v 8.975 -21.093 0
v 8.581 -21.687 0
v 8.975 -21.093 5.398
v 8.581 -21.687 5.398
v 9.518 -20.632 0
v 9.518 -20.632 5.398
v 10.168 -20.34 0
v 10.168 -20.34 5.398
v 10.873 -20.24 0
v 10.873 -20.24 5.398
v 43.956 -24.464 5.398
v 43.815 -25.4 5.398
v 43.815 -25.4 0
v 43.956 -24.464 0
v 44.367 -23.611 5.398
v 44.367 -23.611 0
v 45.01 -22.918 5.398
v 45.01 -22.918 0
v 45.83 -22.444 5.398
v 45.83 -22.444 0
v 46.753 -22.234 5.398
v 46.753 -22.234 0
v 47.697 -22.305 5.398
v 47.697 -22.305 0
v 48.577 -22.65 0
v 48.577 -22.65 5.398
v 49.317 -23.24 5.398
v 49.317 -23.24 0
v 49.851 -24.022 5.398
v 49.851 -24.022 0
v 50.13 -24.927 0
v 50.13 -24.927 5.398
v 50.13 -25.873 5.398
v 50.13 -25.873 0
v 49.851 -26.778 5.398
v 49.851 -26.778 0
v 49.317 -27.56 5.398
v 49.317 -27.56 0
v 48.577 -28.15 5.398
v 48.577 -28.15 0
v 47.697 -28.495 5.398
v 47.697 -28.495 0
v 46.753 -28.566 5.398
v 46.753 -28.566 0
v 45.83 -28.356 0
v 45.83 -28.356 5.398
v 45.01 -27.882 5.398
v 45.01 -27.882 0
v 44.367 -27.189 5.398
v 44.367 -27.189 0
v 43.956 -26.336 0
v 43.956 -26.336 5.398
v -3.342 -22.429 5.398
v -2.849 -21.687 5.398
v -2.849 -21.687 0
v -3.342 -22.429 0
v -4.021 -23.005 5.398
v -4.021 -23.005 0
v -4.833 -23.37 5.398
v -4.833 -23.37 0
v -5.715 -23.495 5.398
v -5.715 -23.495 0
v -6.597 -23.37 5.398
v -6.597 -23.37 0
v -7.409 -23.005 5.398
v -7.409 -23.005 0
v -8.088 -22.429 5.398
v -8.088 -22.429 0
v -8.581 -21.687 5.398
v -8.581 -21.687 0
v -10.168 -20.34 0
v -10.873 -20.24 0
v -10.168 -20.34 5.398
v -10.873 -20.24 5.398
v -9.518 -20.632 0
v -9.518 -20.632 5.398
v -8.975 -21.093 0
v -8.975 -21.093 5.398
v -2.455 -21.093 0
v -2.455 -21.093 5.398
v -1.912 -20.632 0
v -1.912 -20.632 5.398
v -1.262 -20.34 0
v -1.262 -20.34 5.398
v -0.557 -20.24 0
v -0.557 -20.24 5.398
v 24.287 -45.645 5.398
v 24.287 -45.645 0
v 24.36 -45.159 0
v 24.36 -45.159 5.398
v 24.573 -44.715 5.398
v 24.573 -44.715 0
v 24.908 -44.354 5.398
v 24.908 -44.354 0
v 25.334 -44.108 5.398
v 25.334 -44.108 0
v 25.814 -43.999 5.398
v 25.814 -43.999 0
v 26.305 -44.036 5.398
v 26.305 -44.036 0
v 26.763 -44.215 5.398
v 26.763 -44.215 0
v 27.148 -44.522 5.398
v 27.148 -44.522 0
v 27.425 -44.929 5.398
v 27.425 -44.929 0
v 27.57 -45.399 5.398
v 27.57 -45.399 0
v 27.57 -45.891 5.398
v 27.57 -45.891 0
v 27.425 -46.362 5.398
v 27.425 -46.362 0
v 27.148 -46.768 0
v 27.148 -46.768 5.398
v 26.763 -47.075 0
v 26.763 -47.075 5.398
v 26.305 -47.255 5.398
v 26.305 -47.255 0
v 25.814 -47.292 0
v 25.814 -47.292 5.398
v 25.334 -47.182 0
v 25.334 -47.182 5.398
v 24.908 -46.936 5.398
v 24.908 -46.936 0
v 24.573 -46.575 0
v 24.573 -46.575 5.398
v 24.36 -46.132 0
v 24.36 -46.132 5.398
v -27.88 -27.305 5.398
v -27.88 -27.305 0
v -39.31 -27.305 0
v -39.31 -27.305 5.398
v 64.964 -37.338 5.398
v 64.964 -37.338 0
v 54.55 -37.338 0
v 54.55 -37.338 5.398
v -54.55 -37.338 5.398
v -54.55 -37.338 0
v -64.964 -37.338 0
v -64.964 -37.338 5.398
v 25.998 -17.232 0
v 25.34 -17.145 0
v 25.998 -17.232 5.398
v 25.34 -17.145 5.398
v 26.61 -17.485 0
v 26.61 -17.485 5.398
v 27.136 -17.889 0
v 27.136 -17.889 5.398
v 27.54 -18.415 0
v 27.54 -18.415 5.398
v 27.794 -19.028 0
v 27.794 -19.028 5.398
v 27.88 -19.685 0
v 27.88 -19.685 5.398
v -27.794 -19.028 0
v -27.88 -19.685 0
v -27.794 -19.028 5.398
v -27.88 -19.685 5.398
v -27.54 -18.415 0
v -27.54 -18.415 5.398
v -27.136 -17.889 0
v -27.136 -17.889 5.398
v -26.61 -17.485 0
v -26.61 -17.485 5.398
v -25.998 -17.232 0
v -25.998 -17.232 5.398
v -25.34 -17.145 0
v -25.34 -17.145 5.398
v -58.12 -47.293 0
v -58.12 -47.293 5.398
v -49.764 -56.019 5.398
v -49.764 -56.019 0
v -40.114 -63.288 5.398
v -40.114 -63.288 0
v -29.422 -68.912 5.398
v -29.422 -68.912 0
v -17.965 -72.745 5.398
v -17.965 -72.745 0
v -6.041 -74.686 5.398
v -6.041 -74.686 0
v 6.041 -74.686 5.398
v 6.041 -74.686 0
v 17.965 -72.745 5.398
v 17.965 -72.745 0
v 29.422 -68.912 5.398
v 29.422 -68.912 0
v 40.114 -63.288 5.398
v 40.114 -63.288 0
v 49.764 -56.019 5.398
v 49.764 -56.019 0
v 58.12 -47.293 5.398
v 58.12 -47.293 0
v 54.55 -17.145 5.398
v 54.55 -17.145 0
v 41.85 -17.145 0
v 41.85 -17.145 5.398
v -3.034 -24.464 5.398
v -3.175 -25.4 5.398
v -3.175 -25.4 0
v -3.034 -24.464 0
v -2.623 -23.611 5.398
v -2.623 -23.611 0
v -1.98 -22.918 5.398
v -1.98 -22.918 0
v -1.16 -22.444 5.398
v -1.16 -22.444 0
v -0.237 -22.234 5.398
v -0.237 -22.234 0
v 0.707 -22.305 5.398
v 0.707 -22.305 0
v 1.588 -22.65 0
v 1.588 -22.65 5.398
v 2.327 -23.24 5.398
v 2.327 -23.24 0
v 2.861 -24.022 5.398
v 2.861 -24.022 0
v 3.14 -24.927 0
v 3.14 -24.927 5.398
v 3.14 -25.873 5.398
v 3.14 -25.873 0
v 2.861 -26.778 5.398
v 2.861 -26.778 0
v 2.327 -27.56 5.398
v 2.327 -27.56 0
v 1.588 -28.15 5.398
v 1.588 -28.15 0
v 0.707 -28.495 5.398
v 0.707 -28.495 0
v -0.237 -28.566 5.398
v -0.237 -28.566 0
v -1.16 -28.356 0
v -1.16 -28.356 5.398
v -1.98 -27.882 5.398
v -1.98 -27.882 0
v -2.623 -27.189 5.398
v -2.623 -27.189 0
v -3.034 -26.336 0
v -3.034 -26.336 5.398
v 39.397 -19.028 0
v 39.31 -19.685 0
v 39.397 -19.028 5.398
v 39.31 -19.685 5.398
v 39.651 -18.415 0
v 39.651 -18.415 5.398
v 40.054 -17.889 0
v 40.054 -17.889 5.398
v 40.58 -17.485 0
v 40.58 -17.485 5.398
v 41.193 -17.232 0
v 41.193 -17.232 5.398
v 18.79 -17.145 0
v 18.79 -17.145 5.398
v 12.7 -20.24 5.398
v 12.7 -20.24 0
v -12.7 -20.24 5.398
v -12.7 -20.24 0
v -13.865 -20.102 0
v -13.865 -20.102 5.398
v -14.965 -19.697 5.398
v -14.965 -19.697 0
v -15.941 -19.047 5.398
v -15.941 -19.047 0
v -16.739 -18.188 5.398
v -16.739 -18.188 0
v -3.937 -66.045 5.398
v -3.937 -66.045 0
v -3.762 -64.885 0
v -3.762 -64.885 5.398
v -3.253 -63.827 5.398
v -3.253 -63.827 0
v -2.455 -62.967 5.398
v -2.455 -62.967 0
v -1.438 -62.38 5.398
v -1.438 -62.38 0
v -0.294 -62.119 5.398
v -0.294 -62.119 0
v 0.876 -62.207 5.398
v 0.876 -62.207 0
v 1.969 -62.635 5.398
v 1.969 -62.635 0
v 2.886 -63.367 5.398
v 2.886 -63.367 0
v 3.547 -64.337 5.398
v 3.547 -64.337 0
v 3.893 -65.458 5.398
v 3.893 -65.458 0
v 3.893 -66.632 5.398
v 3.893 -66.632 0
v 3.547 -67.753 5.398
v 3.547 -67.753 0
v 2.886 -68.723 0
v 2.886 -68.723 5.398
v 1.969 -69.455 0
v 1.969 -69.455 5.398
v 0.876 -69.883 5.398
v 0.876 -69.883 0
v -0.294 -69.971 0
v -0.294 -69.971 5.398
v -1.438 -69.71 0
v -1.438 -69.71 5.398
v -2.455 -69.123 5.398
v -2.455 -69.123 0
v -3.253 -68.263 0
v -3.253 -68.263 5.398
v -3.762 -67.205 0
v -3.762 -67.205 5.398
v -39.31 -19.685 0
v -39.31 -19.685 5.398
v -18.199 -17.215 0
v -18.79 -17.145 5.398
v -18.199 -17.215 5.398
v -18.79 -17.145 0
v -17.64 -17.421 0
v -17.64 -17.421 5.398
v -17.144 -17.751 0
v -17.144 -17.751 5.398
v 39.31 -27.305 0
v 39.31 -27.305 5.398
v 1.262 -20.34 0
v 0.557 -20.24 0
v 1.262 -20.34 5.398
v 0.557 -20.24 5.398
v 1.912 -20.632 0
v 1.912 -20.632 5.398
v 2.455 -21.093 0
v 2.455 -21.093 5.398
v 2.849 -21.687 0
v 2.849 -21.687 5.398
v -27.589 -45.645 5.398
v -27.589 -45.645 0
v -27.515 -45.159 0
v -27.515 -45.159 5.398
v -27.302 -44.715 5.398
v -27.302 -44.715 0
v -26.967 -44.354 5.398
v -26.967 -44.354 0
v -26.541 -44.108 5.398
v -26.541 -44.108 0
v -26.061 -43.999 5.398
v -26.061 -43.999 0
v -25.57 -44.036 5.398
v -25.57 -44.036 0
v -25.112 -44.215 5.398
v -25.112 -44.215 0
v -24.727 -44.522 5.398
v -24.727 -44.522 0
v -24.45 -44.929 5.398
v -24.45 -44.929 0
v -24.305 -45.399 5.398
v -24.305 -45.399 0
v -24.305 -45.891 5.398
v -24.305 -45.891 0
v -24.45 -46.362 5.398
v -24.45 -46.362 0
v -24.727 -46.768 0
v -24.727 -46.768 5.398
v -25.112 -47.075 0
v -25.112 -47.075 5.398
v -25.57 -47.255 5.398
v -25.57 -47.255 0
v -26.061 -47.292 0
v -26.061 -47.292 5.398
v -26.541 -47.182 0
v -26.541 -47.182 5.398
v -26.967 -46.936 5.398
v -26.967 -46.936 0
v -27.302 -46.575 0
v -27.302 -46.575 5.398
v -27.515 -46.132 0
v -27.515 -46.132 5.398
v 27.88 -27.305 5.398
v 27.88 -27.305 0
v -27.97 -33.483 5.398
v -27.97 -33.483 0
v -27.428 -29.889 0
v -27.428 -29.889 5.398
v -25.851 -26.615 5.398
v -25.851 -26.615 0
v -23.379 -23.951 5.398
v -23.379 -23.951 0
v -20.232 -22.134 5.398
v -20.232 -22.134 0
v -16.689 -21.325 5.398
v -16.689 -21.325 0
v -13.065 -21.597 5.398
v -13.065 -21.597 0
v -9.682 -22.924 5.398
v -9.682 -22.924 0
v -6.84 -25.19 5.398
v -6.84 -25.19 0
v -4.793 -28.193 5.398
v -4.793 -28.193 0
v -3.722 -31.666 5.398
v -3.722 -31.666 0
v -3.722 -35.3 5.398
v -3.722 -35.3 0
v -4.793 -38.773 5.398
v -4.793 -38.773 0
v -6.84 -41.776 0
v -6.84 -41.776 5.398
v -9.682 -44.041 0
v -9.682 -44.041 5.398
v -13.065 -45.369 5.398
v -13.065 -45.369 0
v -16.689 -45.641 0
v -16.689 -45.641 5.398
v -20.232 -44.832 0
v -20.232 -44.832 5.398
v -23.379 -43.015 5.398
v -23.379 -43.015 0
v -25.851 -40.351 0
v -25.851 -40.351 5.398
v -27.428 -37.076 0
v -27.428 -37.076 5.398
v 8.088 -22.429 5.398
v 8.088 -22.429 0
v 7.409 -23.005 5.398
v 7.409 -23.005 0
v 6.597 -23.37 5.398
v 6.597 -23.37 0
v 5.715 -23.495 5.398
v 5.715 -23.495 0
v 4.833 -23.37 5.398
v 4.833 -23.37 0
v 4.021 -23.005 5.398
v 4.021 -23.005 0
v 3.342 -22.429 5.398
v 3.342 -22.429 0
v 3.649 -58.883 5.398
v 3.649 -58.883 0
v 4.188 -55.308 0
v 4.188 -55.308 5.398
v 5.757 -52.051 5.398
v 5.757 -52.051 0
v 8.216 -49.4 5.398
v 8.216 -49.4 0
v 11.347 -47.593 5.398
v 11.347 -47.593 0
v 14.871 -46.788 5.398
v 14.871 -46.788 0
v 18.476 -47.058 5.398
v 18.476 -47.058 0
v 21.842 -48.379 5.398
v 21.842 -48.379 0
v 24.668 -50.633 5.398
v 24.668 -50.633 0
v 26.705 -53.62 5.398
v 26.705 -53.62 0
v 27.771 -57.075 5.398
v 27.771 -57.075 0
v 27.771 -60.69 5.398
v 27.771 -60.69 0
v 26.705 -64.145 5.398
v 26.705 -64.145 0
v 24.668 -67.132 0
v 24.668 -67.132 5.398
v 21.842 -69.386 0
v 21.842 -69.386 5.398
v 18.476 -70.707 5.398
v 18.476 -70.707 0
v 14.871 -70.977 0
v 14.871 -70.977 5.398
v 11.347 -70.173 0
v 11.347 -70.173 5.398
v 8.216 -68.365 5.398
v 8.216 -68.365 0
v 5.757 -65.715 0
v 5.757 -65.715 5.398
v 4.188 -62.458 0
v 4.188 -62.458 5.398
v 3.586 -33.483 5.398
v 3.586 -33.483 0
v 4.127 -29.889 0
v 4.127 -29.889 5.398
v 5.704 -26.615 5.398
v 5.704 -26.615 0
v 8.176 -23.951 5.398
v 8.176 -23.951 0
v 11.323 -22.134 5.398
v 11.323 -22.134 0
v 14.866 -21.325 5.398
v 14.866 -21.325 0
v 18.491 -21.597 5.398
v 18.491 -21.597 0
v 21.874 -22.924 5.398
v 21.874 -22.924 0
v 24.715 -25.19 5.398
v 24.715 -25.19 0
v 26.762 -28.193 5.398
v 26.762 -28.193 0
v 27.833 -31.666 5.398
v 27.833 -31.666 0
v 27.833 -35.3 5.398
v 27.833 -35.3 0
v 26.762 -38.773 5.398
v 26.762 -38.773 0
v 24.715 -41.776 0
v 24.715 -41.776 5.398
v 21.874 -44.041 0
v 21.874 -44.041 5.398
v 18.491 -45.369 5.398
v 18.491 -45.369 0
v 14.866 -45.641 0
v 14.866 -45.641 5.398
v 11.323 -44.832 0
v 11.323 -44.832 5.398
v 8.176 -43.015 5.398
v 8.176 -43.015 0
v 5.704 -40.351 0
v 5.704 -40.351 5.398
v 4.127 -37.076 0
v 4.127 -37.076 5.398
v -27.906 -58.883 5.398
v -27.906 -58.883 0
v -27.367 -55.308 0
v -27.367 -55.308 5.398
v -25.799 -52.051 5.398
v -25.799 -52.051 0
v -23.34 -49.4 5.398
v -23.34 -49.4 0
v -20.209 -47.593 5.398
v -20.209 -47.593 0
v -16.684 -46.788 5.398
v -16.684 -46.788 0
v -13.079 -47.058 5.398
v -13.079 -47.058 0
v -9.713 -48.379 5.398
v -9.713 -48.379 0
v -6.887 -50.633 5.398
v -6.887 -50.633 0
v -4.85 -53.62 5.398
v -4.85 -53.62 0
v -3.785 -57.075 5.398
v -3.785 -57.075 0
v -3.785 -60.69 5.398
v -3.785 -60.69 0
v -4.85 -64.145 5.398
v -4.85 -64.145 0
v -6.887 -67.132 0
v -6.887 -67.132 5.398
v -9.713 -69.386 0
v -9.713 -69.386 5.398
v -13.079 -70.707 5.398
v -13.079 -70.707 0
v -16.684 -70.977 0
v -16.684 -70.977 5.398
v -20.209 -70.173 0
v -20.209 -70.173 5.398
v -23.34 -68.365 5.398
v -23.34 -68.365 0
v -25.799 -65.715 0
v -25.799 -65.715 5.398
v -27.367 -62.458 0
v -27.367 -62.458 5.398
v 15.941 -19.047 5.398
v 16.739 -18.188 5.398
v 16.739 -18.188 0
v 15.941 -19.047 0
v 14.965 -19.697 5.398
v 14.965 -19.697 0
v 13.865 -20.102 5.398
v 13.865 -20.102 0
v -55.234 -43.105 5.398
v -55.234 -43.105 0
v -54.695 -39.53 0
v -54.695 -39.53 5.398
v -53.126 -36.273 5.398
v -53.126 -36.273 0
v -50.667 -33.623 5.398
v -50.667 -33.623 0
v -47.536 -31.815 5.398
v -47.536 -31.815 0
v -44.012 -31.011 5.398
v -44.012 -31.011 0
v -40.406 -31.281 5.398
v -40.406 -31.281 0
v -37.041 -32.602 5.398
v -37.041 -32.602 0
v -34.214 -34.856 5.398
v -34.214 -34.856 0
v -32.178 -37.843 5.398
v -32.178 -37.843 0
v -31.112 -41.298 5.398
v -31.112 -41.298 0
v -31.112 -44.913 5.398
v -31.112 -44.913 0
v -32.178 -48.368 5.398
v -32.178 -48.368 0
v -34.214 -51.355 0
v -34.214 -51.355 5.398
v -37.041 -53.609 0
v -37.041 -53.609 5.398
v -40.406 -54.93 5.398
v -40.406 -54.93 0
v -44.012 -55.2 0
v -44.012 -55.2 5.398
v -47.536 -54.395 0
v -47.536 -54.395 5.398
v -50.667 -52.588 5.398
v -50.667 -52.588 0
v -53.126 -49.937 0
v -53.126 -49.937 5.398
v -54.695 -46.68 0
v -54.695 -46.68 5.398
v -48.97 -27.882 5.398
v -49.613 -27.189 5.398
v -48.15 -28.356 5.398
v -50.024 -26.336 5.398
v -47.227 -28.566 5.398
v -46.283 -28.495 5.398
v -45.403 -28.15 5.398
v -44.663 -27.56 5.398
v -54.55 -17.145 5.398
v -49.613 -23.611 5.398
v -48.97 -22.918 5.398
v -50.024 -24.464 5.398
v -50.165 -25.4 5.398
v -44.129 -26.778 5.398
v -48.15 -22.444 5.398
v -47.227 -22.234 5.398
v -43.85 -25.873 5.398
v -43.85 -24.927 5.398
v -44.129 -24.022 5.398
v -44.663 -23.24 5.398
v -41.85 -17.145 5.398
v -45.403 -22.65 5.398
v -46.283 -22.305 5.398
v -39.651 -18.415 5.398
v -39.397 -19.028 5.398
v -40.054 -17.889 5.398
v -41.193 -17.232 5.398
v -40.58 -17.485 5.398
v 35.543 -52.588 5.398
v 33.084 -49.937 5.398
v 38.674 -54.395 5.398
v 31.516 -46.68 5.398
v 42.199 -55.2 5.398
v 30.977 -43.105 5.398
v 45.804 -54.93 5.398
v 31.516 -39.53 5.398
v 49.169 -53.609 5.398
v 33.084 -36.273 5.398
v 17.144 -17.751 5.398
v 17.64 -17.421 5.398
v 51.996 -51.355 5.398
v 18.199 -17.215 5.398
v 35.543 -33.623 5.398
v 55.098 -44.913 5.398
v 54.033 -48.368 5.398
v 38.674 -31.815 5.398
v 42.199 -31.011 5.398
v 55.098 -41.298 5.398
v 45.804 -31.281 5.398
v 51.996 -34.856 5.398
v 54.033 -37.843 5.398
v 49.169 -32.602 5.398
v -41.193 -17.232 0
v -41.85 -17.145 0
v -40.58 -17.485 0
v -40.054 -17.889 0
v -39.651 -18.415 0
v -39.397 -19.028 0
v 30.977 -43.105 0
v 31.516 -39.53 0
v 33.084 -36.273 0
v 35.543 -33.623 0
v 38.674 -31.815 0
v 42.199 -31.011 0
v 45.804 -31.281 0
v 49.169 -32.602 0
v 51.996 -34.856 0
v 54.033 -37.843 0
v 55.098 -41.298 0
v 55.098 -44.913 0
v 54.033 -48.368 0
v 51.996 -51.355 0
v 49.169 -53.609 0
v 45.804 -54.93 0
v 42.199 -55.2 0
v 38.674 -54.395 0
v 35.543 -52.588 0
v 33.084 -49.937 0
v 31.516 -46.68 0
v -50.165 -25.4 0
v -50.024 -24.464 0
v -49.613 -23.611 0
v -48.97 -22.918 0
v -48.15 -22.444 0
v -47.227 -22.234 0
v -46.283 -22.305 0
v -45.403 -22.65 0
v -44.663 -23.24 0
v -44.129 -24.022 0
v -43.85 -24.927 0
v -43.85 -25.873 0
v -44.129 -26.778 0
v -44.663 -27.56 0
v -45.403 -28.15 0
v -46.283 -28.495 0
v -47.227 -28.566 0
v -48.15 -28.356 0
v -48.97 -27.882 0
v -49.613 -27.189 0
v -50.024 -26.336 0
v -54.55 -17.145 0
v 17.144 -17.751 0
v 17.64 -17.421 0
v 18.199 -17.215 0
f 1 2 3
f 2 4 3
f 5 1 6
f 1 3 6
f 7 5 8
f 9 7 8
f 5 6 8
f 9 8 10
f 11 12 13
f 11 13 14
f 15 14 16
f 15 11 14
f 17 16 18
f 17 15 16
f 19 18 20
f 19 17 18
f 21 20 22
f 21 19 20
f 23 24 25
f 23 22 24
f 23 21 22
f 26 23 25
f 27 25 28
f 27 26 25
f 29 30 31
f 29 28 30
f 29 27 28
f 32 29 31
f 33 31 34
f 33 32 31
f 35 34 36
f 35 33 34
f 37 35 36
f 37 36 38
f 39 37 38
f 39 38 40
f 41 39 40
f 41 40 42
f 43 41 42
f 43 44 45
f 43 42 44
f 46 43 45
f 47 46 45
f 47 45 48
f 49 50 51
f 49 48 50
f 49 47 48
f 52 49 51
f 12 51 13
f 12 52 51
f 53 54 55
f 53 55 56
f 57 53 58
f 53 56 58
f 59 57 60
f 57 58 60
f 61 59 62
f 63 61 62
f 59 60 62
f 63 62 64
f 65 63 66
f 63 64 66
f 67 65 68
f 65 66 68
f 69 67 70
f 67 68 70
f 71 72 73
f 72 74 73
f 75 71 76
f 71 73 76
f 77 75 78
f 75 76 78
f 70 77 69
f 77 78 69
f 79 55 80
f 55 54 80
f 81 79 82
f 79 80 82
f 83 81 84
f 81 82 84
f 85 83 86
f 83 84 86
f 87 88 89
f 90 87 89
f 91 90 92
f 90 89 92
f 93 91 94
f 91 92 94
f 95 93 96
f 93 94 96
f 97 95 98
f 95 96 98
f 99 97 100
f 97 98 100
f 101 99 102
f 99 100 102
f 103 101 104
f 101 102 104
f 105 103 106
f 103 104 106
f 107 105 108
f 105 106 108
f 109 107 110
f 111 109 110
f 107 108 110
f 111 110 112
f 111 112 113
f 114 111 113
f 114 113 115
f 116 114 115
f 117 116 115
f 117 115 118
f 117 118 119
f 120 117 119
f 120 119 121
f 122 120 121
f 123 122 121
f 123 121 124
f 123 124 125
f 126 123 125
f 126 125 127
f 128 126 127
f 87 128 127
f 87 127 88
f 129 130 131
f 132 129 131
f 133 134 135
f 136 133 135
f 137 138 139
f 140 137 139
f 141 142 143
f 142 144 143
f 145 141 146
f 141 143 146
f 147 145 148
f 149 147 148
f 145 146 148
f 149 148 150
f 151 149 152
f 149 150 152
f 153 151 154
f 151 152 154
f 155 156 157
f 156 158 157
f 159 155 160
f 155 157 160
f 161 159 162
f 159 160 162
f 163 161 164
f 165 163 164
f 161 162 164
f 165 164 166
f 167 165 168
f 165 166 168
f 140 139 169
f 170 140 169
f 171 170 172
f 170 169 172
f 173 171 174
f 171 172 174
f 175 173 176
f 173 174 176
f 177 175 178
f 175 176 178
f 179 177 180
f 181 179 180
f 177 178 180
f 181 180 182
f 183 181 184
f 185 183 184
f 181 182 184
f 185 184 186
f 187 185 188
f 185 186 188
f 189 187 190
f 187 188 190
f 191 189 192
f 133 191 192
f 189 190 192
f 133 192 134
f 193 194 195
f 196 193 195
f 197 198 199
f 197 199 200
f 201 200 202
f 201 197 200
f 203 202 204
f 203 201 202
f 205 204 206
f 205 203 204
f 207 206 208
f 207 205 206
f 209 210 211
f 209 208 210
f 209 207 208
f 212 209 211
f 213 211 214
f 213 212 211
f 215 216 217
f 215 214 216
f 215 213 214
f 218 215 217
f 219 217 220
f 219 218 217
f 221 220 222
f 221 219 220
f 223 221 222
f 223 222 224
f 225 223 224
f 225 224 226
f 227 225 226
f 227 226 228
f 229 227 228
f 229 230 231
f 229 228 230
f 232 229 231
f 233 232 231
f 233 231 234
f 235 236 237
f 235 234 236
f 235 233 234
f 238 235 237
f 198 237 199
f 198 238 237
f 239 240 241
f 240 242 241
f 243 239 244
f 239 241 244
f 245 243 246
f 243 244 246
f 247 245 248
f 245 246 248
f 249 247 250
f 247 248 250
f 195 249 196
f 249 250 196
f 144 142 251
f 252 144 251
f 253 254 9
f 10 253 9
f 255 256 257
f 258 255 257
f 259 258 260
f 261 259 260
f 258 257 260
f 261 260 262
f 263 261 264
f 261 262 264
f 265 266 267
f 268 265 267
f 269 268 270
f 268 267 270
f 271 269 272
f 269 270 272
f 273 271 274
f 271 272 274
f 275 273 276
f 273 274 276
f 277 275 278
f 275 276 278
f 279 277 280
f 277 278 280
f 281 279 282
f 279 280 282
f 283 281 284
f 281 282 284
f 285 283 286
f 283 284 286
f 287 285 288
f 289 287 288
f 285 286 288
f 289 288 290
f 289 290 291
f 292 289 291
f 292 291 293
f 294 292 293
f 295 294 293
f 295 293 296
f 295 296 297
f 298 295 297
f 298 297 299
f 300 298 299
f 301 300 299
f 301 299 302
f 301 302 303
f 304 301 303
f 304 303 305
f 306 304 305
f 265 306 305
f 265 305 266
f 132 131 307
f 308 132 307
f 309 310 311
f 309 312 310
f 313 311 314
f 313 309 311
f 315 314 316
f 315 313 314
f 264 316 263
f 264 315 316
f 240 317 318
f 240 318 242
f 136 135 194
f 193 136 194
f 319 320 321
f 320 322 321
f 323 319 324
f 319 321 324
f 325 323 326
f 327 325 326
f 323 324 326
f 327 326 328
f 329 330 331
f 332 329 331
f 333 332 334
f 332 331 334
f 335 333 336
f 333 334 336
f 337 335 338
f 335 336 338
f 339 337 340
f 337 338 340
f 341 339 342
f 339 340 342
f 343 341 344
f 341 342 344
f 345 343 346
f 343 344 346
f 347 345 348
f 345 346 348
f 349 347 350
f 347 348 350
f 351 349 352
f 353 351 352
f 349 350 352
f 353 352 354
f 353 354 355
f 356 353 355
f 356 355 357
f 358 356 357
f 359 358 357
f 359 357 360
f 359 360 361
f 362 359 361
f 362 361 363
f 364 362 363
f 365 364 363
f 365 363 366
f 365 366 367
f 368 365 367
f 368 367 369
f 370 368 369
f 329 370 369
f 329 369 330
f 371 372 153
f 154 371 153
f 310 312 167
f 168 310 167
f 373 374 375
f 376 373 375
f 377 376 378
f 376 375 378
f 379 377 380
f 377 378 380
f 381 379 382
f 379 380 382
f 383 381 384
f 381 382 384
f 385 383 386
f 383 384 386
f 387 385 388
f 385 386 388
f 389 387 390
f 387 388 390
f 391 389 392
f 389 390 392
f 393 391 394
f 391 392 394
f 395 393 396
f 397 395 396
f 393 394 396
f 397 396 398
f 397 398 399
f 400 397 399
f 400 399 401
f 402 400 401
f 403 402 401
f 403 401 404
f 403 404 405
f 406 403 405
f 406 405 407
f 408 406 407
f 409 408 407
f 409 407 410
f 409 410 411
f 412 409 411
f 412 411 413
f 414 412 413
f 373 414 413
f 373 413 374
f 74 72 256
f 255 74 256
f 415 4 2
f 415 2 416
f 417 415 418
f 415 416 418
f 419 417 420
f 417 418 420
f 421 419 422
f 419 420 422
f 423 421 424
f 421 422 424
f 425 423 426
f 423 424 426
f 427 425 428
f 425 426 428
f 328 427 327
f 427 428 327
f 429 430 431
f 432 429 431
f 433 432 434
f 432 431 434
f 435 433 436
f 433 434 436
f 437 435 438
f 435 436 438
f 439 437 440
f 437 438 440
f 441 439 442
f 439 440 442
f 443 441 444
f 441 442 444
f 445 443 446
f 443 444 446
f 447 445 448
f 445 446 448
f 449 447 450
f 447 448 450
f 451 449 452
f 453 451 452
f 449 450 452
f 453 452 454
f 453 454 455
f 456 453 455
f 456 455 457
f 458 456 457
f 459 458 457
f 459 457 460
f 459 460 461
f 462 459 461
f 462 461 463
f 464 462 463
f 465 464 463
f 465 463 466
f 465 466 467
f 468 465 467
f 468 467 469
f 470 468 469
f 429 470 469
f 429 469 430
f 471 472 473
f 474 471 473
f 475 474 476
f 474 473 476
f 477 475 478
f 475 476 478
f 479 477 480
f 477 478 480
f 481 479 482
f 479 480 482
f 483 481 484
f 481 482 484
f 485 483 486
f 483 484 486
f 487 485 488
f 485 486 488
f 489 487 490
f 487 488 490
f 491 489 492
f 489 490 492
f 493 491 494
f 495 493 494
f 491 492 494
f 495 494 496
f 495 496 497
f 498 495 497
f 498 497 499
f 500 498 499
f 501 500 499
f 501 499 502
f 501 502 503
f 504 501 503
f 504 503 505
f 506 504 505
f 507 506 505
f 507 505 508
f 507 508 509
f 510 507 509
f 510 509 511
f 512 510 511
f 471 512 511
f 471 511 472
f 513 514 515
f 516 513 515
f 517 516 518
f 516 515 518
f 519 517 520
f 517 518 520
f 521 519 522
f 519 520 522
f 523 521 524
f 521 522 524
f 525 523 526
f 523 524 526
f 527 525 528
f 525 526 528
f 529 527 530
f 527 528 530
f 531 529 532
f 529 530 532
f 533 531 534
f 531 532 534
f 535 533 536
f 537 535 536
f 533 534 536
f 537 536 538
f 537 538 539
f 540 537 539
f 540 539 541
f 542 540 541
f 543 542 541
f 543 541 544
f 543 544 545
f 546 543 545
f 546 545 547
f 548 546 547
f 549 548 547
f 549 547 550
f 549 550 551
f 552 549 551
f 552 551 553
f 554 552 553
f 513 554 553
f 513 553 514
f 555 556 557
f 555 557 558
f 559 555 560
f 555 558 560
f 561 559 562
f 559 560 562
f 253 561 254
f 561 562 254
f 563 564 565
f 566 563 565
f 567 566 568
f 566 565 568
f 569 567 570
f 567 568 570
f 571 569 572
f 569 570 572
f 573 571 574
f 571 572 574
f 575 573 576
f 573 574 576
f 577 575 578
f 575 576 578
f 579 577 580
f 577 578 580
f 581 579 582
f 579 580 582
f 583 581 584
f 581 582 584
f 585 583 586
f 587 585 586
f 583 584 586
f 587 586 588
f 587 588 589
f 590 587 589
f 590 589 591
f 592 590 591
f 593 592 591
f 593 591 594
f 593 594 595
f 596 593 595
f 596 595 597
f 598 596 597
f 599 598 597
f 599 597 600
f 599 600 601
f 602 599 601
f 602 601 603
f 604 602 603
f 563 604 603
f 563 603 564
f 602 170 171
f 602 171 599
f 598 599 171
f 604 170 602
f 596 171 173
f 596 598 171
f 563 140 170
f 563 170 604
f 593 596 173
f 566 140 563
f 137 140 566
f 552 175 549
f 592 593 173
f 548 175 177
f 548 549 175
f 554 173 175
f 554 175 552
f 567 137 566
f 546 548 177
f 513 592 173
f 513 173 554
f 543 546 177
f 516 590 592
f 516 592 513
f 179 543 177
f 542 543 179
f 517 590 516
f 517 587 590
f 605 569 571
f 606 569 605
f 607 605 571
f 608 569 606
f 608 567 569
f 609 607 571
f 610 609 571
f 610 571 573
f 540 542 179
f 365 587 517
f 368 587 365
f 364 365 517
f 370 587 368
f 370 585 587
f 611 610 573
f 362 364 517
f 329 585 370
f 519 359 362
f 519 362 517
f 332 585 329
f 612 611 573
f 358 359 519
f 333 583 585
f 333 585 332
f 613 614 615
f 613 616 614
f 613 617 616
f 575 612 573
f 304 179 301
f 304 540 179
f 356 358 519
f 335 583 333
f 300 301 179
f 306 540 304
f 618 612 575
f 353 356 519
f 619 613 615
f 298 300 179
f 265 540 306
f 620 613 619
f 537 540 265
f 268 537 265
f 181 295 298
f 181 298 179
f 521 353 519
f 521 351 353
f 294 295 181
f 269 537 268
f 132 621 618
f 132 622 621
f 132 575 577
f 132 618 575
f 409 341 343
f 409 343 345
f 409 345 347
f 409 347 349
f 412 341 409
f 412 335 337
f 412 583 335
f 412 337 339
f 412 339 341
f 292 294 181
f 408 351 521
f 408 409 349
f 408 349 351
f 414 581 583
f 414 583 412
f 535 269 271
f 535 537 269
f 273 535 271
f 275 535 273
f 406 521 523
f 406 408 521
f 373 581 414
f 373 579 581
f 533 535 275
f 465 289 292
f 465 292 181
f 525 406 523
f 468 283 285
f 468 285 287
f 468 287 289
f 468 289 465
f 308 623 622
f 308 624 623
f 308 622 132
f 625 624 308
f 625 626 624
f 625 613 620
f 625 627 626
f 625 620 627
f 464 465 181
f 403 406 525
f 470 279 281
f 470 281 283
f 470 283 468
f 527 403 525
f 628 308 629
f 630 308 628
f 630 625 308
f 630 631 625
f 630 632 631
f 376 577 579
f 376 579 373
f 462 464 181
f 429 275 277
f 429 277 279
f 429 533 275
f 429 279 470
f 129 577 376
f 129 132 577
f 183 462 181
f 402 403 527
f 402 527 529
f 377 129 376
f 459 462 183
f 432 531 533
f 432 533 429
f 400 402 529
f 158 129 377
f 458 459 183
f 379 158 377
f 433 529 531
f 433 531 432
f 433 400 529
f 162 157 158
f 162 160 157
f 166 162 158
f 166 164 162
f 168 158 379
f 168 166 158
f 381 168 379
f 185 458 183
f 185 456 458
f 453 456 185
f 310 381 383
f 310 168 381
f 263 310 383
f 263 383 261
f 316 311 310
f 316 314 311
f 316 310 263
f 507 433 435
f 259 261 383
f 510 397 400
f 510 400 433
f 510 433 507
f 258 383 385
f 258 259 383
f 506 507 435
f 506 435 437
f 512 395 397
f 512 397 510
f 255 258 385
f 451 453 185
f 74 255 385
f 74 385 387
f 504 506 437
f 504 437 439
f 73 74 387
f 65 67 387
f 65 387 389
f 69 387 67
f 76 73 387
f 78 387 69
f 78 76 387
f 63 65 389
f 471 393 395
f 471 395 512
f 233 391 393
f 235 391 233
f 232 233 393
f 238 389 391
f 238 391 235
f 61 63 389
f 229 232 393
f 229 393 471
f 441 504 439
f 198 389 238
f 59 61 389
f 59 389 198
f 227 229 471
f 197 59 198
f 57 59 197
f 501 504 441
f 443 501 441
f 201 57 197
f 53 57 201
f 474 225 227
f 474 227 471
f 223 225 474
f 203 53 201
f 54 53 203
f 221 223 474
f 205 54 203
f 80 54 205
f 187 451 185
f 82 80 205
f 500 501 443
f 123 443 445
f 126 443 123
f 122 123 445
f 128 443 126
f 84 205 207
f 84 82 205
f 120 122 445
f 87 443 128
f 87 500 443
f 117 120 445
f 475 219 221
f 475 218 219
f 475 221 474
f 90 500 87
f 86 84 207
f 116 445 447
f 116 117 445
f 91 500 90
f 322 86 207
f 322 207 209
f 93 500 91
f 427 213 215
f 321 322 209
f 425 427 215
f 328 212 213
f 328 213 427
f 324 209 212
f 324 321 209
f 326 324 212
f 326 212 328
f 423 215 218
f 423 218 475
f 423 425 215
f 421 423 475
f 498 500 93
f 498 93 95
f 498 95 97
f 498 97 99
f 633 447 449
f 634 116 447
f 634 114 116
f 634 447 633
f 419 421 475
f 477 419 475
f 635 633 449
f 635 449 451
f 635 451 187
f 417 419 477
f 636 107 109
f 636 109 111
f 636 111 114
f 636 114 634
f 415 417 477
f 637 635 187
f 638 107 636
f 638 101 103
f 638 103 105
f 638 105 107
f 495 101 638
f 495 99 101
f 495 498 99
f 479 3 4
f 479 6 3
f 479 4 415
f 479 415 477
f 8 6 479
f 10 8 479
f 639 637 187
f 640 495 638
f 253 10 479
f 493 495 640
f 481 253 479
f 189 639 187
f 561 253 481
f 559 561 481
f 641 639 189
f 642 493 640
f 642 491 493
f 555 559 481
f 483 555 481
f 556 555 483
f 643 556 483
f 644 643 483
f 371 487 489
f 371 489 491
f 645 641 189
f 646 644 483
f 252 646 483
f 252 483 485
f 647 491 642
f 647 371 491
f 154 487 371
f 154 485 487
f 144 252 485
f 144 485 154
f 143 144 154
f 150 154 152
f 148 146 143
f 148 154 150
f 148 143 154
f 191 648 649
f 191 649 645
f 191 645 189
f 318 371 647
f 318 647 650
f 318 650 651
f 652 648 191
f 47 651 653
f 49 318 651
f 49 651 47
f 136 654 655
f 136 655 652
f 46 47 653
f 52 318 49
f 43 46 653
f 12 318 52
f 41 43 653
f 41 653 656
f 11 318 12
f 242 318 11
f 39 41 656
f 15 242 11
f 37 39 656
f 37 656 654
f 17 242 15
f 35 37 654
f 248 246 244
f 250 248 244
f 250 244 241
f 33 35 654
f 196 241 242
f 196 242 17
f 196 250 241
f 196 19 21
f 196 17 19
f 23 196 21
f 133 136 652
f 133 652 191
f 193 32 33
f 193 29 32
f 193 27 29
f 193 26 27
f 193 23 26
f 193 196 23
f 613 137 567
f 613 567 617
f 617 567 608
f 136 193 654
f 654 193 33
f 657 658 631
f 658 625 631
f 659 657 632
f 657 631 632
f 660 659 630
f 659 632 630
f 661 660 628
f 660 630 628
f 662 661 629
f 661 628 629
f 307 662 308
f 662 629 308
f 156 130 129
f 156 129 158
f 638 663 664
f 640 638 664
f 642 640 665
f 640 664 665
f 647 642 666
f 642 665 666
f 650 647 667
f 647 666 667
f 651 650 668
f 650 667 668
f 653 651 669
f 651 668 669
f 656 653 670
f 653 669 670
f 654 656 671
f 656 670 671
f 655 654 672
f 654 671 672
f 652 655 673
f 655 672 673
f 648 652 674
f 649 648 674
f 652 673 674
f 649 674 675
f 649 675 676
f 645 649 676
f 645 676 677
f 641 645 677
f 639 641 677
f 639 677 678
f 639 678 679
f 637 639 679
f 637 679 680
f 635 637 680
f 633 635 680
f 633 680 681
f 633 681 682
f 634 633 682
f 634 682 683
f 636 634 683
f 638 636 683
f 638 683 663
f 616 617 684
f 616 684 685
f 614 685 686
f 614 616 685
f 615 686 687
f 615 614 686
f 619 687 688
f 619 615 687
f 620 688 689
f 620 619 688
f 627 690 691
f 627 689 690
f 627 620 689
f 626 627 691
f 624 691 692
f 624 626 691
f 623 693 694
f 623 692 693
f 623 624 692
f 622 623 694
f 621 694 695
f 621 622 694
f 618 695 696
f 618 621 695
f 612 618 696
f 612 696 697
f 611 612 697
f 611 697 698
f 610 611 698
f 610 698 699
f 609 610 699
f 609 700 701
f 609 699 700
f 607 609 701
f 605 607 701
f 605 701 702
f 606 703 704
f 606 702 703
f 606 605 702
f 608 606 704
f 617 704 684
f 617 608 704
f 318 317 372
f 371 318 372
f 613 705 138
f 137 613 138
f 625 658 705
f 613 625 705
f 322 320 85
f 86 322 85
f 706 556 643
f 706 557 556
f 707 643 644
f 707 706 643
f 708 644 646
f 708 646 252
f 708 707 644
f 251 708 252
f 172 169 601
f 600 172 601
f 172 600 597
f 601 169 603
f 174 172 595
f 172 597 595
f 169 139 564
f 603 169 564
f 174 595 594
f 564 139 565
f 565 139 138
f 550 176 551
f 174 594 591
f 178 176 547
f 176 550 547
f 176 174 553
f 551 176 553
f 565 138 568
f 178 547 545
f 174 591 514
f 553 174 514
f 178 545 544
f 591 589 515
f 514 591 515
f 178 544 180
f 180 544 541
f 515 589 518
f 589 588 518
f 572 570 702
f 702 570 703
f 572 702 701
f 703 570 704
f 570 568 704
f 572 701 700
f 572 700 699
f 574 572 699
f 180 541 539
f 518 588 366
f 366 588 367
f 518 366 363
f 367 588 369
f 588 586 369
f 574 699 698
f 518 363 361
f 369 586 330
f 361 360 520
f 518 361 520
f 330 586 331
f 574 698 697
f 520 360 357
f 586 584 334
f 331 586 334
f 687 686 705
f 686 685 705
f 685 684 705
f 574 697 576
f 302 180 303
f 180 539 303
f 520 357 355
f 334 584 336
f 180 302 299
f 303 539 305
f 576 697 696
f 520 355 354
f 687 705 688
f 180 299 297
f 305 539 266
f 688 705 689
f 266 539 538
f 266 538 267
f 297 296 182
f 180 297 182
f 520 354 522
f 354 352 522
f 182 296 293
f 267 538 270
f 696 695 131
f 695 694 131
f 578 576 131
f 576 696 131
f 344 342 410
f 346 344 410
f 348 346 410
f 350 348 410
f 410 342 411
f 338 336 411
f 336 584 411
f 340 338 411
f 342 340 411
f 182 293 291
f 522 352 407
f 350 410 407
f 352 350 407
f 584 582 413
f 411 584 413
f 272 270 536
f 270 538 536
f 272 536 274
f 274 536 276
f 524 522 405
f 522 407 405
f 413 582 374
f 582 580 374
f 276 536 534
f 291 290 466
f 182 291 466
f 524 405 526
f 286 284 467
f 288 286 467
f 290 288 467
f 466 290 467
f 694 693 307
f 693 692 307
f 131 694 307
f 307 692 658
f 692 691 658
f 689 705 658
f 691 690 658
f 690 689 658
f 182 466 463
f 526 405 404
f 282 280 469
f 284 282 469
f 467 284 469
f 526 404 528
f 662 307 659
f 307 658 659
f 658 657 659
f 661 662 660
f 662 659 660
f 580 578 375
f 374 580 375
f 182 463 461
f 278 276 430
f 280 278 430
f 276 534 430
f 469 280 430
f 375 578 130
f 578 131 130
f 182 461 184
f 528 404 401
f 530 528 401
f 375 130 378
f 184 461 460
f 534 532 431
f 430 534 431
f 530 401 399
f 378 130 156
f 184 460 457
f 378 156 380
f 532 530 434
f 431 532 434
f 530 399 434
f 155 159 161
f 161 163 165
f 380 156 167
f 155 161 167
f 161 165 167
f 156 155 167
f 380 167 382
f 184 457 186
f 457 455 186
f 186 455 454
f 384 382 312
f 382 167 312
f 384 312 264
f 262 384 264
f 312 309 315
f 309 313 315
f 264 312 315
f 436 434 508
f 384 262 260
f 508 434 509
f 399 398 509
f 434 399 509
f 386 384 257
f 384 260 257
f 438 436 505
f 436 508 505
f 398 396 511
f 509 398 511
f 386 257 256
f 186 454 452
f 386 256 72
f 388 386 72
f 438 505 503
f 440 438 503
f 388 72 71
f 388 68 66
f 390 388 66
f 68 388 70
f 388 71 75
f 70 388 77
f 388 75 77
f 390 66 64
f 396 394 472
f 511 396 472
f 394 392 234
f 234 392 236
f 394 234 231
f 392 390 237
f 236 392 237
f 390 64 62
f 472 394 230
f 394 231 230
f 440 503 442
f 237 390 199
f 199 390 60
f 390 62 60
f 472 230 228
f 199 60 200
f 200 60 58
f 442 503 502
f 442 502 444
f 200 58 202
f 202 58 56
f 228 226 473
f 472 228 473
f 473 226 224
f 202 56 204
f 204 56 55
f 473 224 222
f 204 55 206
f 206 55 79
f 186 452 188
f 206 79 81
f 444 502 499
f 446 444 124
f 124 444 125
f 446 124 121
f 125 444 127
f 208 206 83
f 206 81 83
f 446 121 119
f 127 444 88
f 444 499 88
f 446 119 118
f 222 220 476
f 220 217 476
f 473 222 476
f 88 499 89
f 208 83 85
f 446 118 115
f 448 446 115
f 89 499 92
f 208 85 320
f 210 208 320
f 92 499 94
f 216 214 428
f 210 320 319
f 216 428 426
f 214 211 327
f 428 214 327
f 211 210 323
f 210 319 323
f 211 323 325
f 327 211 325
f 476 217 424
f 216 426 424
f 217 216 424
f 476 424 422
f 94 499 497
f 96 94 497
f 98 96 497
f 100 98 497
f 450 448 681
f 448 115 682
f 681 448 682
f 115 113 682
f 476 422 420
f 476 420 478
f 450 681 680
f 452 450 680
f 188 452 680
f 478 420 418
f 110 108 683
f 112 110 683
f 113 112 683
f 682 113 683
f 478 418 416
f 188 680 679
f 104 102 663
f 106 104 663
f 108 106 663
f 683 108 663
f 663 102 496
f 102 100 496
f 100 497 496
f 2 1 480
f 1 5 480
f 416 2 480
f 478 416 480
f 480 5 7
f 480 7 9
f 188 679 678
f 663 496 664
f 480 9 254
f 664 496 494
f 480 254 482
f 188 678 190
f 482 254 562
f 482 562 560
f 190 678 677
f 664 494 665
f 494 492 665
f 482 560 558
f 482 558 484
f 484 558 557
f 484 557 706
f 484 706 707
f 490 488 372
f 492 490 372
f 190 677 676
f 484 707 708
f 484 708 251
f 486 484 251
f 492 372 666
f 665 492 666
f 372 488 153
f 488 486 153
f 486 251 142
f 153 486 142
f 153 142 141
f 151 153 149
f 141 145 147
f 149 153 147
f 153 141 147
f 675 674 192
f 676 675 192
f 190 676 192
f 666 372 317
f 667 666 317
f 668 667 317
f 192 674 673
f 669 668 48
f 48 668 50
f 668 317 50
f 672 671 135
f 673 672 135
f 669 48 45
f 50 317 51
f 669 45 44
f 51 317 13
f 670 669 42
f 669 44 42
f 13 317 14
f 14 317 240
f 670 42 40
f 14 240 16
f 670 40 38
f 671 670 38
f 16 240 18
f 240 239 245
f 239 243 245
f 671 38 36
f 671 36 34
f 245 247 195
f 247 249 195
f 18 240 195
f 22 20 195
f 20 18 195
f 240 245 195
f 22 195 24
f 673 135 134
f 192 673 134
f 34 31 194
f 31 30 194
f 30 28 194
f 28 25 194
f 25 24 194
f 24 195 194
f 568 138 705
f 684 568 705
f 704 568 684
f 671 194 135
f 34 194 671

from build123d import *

# Parameters (mm, degrees)
SKETCH1_R                = 1.651
BOSS_EXTRUDE2_DEPTH      = 5.3975
SKETCH2_R                = 1.143
CUT_EXTRUDE1_DEPTH       = 6.3975
SKETCH3_R                = 12.1285
CUT_EXTRUDE2_DEPTH       = 6.3975
SKETCH4_W                = 28.562713242
SKETCH4_H                = 11.677503754
BOSS_EXTRUDE3_DEPTH      = 5.3975
SKETCH5_W                = 216.7214489
SKETCH5_H                = 130.569220634
CUT_EXTRUDE4_DEPTH       = 6.3975
SKETCH11_R               = 3.937
CUT_EXTRUDE11_DEPTH      = 6.3975
SKETCH12_W               = 11.43
SKETCH12_H               = 10.16
CUT_EXTRUDE12_DEPTH      = 6.3975
SKETCH16_R               = 12.192
CUT_EXTRUDE16_DEPTH      = 21.59
SKETCH57_R               = 1.651
CUT_EXTRUDE57_DEPTH      = 58.674
SKETCH58_R               = 3.175
CUT_EXTRUDE58_DEPTH      = 103.378
CUT_EXTRUDE58_DEPTH_BACK = 48.768
CUT_EXTRUDE15_DEPTH      = 21.59
FILLET1_R                = 2.54


with BuildPart() as part:
    # Sketch1 → Boss-Extrude2 (new body)
    with BuildSketch(Plane.XY):
        with BuildLine():
            Line((-64.964441474, 37.338), (-54.550441474, 37.338))
            Line((-54.550441474, 37.338), (-54.550441474, -37.338))
            Line((-54.550441474, -37.338), (-64.964441474, -37.338))
            ThreePointArc((-64.964441474, -37.338), (0, -74.93), (64.964441474, -37.338))
            Line((64.964441474, -37.338), (54.550441474, -37.338))
            Line((54.550441474, -37.338), (54.550441474, 37.338))
            Line((54.550441474, 37.338), (64.964441474, 37.338))
            ThreePointArc((64.964441474, 37.338), (0, 74.93), (-64.964441474, 37.338))
        make_face()
        with Locations((-46.482, 11.049)):
            Circle(SKETCH1_R, mode=Mode.SUBTRACT)
        with Locations((-21.083270032, 10.795)):
            Circle(SKETCH1_R, mode=Mode.SUBTRACT)
        with Locations((-21.083270032, -10.795)):
            Circle(SKETCH1_R, mode=Mode.SUBTRACT)
        with Locations((-46.482, -11.049)):
            Circle(SKETCH1_R, mode=Mode.SUBTRACT)
        with Locations((46.482, -11.049)):
            Circle(SKETCH1_R, mode=Mode.SUBTRACT)
        with Locations((21.083270032, -10.795)):
            Circle(SKETCH1_R, mode=Mode.SUBTRACT)
        with Locations((21.083270032, 10.795)):
            Circle(SKETCH1_R, mode=Mode.SUBTRACT)
        with Locations((46.482, 11.049)):
            Circle(SKETCH1_R, mode=Mode.SUBTRACT)
    extrude(amount=BOSS_EXTRUDE2_DEPTH)

    # Sketch2 → Cut-Extrude1 (cut, through all)
    with BuildSketch(Plane.XY.offset(5.3975)):
        with Locations((-6.731, 62.23)):
            Circle(SKETCH2_R)
        with Locations((6.731, 62.23)):
            Circle(SKETCH2_R)
    extrude(amount=-CUT_EXTRUDE1_DEPTH, mode=Mode.SUBTRACT)

    # Sketch3 → Cut-Extrude2 (cut, through all)
    with BuildSketch(Plane(origin=(0, 0, 0), x_dir=(-1, 0, 0), z_dir=(0, 0, -1))):
        with Locations((-15.777608989, -58.882838371)):
            Circle(SKETCH3_R)
        with Locations((15.777608989, -58.882838371)):
            Circle(SKETCH3_R)
        with Locations((-43.105229381, -43.105229381)):
            Circle(SKETCH3_R)
        with Locations((-43.105229381, 43.105229381)):
            Circle(SKETCH3_R)
        with Locations((43.105229381, 43.105229381)):
            Circle(SKETCH3_R)
        with Locations((43.105229381, -43.105229381)):
            Circle(SKETCH3_R)
    extrude(amount=-CUT_EXTRUDE2_DEPTH, mode=Mode.SUBTRACT)

    # Sketch4 → Boss-Extrude3 (add)
    with BuildSketch(Plane(origin=(0, 0, 0), x_dir=(-1, 0, 0), z_dir=(0, 0, -1))):
        with Locations((-1.488809975, 62.152540216)):
            Rectangle(SKETCH4_W, SKETCH4_H)
    extrude(amount=-BOSS_EXTRUDE3_DEPTH)

    # Sketch5 → Cut-Extrude4 (cut, through all)
    with BuildSketch(Plane(origin=(0, 0, 0), x_dir=(-1, 0, 0), z_dir=(0, 0, -1))):
        with Locations((23.316688373, 48.139610317)):
            Rectangle(SKETCH5_W, SKETCH5_H)
    extrude(amount=-CUT_EXTRUDE4_DEPTH, mode=Mode.SUBTRACT)

    # Sketch11 → Cut-Extrude11 (cut, through all)
    with BuildSketch(Plane(origin=(0, 0, 0), x_dir=(-1, 0, 0), z_dir=(0, 0, -1))):
        with Locations((0, -66.045)):
            Circle(SKETCH11_R)
    extrude(amount=-CUT_EXTRUDE11_DEPTH, mode=Mode.SUBTRACT)

    # Sketch12 → Cut-Extrude12 (cut, through all)
    with BuildSketch(Plane(origin=(0, 0, 0), x_dir=(-1, 0, 0), z_dir=(0, 0, -1))):
        with Locations((-33.595441474, -22.225)):
            Rectangle(SKETCH12_W, SKETCH12_H)
        with Locations((33.595441474, -22.225)):
            Rectangle(SKETCH12_W, SKETCH12_H)
    extrude(amount=-CUT_EXTRUDE12_DEPTH, mode=Mode.SUBTRACT)

    # Sketch16 → Cut-Extrude16 (cut)
    with BuildSketch(Plane(origin=(0, 0, 0), x_dir=(-1, 0, 0), z_dir=(0, 0, -1))):
        with Locations((15.777608989, -33.482838371)):
            Circle(SKETCH16_R)
        with Locations((-15.777608989, -33.482838371)):
            Circle(SKETCH16_R)
    extrude(amount=-CUT_EXTRUDE16_DEPTH, mode=Mode.SUBTRACT)

    # Sketch57 → Cut-Extrude57 (cut)
    with BuildSketch(Plane(origin=(0, 0, 0), x_dir=(-1, 0, 0), z_dir=(0, 0, -1))):
        with Locations((-25.937608989, -45.645229381)):
            Circle(SKETCH57_R)
        with Locations((25.937608989, -45.645229381)):
            Circle(SKETCH57_R)
    extrude(amount=-CUT_EXTRUDE57_DEPTH, mode=Mode.SUBTRACT)

    # Sketch58 → Cut-Extrude58 (cut, two sides)
    with BuildSketch(Plane(origin=(30.092005081, 4.08352975, 36.1315), x_dir=(-1, 0, 0), z_dir=(0, 0, -1))) as cut_extrude58_sk:
        with Locations((77.082005081, -29.48352975)):
            Circle(SKETCH58_R)
        with Locations((30.092005081, -29.48352975)):
            Circle(SKETCH58_R)
        with Locations((-16.897994919, -29.48352975)):
            Circle(SKETCH58_R)
    extrude(amount=CUT_EXTRUDE58_DEPTH, mode=Mode.SUBTRACT)
    extrude(cut_extrude58_sk.sketch, amount=-CUT_EXTRUDE58_DEPTH_BACK, mode=Mode.SUBTRACT)

    # Sketch15 → Cut-Extrude15 (cut)
    with BuildSketch(Plane(origin=(0, 0, 0), x_dir=(-1, 0, 0), z_dir=(0, 0, -1))):
        with BuildLine():
            Line((-12.7, -20.24), (-8.888991966, -20.24))
            ThreePointArc((-8.888991966, -20.24), (-5.715, -23.495), (-2.541008034, -20.24))
            Line((-2.541008034, -20.24), (2.541008034, -20.24))
            ThreePointArc((2.541008034, -20.24), (5.715, -23.495), (8.888991966, -20.24))
            Line((8.888991966, -20.24), (12.7, -20.24))
            ThreePointArc((12.7, -20.24), (16.235533906, -11.704466094), (7.7, -15.24))
            Line((7.7, -15.24), (-1.06, -15.24))
            ThreePointArc((-1.06, -15.24), (-4.010609847, -10.6792983), (-9.38, -11.501337137))
            ThreePointArc((-9.38, -11.501337137), (-17.374040774, -13.464234575), (-12.7, -20.24))
        make_face()
    extrude(amount=-CUT_EXTRUDE15_DEPTH, mode=Mode.SUBTRACT)

    # Fillet1
    fillet1_edges = [part.edges().sort_by_distance(p)[0] for p in [
        (39.310441474, -17.145, 2.69875),
        (27.880441474, -17.145, 2.69875),
        (-27.880441474, -17.145, 2.69875),
        (-39.310441474, -17.145, 2.69875),
        (-17.322875188, -17.145, 2.69875),
        (17.322875188, -17.145, 2.69875),
        (-8.888991966, -20.24, 2.69875),
        (-2.541008034, -20.24, 2.69875),
        (2.541008034, -20.24, 2.69875),
        (8.888991966, -20.24, 2.69875),
    ]]
    fillet(fillet1_edges, radius=FILLET1_R)


solid = part.part
